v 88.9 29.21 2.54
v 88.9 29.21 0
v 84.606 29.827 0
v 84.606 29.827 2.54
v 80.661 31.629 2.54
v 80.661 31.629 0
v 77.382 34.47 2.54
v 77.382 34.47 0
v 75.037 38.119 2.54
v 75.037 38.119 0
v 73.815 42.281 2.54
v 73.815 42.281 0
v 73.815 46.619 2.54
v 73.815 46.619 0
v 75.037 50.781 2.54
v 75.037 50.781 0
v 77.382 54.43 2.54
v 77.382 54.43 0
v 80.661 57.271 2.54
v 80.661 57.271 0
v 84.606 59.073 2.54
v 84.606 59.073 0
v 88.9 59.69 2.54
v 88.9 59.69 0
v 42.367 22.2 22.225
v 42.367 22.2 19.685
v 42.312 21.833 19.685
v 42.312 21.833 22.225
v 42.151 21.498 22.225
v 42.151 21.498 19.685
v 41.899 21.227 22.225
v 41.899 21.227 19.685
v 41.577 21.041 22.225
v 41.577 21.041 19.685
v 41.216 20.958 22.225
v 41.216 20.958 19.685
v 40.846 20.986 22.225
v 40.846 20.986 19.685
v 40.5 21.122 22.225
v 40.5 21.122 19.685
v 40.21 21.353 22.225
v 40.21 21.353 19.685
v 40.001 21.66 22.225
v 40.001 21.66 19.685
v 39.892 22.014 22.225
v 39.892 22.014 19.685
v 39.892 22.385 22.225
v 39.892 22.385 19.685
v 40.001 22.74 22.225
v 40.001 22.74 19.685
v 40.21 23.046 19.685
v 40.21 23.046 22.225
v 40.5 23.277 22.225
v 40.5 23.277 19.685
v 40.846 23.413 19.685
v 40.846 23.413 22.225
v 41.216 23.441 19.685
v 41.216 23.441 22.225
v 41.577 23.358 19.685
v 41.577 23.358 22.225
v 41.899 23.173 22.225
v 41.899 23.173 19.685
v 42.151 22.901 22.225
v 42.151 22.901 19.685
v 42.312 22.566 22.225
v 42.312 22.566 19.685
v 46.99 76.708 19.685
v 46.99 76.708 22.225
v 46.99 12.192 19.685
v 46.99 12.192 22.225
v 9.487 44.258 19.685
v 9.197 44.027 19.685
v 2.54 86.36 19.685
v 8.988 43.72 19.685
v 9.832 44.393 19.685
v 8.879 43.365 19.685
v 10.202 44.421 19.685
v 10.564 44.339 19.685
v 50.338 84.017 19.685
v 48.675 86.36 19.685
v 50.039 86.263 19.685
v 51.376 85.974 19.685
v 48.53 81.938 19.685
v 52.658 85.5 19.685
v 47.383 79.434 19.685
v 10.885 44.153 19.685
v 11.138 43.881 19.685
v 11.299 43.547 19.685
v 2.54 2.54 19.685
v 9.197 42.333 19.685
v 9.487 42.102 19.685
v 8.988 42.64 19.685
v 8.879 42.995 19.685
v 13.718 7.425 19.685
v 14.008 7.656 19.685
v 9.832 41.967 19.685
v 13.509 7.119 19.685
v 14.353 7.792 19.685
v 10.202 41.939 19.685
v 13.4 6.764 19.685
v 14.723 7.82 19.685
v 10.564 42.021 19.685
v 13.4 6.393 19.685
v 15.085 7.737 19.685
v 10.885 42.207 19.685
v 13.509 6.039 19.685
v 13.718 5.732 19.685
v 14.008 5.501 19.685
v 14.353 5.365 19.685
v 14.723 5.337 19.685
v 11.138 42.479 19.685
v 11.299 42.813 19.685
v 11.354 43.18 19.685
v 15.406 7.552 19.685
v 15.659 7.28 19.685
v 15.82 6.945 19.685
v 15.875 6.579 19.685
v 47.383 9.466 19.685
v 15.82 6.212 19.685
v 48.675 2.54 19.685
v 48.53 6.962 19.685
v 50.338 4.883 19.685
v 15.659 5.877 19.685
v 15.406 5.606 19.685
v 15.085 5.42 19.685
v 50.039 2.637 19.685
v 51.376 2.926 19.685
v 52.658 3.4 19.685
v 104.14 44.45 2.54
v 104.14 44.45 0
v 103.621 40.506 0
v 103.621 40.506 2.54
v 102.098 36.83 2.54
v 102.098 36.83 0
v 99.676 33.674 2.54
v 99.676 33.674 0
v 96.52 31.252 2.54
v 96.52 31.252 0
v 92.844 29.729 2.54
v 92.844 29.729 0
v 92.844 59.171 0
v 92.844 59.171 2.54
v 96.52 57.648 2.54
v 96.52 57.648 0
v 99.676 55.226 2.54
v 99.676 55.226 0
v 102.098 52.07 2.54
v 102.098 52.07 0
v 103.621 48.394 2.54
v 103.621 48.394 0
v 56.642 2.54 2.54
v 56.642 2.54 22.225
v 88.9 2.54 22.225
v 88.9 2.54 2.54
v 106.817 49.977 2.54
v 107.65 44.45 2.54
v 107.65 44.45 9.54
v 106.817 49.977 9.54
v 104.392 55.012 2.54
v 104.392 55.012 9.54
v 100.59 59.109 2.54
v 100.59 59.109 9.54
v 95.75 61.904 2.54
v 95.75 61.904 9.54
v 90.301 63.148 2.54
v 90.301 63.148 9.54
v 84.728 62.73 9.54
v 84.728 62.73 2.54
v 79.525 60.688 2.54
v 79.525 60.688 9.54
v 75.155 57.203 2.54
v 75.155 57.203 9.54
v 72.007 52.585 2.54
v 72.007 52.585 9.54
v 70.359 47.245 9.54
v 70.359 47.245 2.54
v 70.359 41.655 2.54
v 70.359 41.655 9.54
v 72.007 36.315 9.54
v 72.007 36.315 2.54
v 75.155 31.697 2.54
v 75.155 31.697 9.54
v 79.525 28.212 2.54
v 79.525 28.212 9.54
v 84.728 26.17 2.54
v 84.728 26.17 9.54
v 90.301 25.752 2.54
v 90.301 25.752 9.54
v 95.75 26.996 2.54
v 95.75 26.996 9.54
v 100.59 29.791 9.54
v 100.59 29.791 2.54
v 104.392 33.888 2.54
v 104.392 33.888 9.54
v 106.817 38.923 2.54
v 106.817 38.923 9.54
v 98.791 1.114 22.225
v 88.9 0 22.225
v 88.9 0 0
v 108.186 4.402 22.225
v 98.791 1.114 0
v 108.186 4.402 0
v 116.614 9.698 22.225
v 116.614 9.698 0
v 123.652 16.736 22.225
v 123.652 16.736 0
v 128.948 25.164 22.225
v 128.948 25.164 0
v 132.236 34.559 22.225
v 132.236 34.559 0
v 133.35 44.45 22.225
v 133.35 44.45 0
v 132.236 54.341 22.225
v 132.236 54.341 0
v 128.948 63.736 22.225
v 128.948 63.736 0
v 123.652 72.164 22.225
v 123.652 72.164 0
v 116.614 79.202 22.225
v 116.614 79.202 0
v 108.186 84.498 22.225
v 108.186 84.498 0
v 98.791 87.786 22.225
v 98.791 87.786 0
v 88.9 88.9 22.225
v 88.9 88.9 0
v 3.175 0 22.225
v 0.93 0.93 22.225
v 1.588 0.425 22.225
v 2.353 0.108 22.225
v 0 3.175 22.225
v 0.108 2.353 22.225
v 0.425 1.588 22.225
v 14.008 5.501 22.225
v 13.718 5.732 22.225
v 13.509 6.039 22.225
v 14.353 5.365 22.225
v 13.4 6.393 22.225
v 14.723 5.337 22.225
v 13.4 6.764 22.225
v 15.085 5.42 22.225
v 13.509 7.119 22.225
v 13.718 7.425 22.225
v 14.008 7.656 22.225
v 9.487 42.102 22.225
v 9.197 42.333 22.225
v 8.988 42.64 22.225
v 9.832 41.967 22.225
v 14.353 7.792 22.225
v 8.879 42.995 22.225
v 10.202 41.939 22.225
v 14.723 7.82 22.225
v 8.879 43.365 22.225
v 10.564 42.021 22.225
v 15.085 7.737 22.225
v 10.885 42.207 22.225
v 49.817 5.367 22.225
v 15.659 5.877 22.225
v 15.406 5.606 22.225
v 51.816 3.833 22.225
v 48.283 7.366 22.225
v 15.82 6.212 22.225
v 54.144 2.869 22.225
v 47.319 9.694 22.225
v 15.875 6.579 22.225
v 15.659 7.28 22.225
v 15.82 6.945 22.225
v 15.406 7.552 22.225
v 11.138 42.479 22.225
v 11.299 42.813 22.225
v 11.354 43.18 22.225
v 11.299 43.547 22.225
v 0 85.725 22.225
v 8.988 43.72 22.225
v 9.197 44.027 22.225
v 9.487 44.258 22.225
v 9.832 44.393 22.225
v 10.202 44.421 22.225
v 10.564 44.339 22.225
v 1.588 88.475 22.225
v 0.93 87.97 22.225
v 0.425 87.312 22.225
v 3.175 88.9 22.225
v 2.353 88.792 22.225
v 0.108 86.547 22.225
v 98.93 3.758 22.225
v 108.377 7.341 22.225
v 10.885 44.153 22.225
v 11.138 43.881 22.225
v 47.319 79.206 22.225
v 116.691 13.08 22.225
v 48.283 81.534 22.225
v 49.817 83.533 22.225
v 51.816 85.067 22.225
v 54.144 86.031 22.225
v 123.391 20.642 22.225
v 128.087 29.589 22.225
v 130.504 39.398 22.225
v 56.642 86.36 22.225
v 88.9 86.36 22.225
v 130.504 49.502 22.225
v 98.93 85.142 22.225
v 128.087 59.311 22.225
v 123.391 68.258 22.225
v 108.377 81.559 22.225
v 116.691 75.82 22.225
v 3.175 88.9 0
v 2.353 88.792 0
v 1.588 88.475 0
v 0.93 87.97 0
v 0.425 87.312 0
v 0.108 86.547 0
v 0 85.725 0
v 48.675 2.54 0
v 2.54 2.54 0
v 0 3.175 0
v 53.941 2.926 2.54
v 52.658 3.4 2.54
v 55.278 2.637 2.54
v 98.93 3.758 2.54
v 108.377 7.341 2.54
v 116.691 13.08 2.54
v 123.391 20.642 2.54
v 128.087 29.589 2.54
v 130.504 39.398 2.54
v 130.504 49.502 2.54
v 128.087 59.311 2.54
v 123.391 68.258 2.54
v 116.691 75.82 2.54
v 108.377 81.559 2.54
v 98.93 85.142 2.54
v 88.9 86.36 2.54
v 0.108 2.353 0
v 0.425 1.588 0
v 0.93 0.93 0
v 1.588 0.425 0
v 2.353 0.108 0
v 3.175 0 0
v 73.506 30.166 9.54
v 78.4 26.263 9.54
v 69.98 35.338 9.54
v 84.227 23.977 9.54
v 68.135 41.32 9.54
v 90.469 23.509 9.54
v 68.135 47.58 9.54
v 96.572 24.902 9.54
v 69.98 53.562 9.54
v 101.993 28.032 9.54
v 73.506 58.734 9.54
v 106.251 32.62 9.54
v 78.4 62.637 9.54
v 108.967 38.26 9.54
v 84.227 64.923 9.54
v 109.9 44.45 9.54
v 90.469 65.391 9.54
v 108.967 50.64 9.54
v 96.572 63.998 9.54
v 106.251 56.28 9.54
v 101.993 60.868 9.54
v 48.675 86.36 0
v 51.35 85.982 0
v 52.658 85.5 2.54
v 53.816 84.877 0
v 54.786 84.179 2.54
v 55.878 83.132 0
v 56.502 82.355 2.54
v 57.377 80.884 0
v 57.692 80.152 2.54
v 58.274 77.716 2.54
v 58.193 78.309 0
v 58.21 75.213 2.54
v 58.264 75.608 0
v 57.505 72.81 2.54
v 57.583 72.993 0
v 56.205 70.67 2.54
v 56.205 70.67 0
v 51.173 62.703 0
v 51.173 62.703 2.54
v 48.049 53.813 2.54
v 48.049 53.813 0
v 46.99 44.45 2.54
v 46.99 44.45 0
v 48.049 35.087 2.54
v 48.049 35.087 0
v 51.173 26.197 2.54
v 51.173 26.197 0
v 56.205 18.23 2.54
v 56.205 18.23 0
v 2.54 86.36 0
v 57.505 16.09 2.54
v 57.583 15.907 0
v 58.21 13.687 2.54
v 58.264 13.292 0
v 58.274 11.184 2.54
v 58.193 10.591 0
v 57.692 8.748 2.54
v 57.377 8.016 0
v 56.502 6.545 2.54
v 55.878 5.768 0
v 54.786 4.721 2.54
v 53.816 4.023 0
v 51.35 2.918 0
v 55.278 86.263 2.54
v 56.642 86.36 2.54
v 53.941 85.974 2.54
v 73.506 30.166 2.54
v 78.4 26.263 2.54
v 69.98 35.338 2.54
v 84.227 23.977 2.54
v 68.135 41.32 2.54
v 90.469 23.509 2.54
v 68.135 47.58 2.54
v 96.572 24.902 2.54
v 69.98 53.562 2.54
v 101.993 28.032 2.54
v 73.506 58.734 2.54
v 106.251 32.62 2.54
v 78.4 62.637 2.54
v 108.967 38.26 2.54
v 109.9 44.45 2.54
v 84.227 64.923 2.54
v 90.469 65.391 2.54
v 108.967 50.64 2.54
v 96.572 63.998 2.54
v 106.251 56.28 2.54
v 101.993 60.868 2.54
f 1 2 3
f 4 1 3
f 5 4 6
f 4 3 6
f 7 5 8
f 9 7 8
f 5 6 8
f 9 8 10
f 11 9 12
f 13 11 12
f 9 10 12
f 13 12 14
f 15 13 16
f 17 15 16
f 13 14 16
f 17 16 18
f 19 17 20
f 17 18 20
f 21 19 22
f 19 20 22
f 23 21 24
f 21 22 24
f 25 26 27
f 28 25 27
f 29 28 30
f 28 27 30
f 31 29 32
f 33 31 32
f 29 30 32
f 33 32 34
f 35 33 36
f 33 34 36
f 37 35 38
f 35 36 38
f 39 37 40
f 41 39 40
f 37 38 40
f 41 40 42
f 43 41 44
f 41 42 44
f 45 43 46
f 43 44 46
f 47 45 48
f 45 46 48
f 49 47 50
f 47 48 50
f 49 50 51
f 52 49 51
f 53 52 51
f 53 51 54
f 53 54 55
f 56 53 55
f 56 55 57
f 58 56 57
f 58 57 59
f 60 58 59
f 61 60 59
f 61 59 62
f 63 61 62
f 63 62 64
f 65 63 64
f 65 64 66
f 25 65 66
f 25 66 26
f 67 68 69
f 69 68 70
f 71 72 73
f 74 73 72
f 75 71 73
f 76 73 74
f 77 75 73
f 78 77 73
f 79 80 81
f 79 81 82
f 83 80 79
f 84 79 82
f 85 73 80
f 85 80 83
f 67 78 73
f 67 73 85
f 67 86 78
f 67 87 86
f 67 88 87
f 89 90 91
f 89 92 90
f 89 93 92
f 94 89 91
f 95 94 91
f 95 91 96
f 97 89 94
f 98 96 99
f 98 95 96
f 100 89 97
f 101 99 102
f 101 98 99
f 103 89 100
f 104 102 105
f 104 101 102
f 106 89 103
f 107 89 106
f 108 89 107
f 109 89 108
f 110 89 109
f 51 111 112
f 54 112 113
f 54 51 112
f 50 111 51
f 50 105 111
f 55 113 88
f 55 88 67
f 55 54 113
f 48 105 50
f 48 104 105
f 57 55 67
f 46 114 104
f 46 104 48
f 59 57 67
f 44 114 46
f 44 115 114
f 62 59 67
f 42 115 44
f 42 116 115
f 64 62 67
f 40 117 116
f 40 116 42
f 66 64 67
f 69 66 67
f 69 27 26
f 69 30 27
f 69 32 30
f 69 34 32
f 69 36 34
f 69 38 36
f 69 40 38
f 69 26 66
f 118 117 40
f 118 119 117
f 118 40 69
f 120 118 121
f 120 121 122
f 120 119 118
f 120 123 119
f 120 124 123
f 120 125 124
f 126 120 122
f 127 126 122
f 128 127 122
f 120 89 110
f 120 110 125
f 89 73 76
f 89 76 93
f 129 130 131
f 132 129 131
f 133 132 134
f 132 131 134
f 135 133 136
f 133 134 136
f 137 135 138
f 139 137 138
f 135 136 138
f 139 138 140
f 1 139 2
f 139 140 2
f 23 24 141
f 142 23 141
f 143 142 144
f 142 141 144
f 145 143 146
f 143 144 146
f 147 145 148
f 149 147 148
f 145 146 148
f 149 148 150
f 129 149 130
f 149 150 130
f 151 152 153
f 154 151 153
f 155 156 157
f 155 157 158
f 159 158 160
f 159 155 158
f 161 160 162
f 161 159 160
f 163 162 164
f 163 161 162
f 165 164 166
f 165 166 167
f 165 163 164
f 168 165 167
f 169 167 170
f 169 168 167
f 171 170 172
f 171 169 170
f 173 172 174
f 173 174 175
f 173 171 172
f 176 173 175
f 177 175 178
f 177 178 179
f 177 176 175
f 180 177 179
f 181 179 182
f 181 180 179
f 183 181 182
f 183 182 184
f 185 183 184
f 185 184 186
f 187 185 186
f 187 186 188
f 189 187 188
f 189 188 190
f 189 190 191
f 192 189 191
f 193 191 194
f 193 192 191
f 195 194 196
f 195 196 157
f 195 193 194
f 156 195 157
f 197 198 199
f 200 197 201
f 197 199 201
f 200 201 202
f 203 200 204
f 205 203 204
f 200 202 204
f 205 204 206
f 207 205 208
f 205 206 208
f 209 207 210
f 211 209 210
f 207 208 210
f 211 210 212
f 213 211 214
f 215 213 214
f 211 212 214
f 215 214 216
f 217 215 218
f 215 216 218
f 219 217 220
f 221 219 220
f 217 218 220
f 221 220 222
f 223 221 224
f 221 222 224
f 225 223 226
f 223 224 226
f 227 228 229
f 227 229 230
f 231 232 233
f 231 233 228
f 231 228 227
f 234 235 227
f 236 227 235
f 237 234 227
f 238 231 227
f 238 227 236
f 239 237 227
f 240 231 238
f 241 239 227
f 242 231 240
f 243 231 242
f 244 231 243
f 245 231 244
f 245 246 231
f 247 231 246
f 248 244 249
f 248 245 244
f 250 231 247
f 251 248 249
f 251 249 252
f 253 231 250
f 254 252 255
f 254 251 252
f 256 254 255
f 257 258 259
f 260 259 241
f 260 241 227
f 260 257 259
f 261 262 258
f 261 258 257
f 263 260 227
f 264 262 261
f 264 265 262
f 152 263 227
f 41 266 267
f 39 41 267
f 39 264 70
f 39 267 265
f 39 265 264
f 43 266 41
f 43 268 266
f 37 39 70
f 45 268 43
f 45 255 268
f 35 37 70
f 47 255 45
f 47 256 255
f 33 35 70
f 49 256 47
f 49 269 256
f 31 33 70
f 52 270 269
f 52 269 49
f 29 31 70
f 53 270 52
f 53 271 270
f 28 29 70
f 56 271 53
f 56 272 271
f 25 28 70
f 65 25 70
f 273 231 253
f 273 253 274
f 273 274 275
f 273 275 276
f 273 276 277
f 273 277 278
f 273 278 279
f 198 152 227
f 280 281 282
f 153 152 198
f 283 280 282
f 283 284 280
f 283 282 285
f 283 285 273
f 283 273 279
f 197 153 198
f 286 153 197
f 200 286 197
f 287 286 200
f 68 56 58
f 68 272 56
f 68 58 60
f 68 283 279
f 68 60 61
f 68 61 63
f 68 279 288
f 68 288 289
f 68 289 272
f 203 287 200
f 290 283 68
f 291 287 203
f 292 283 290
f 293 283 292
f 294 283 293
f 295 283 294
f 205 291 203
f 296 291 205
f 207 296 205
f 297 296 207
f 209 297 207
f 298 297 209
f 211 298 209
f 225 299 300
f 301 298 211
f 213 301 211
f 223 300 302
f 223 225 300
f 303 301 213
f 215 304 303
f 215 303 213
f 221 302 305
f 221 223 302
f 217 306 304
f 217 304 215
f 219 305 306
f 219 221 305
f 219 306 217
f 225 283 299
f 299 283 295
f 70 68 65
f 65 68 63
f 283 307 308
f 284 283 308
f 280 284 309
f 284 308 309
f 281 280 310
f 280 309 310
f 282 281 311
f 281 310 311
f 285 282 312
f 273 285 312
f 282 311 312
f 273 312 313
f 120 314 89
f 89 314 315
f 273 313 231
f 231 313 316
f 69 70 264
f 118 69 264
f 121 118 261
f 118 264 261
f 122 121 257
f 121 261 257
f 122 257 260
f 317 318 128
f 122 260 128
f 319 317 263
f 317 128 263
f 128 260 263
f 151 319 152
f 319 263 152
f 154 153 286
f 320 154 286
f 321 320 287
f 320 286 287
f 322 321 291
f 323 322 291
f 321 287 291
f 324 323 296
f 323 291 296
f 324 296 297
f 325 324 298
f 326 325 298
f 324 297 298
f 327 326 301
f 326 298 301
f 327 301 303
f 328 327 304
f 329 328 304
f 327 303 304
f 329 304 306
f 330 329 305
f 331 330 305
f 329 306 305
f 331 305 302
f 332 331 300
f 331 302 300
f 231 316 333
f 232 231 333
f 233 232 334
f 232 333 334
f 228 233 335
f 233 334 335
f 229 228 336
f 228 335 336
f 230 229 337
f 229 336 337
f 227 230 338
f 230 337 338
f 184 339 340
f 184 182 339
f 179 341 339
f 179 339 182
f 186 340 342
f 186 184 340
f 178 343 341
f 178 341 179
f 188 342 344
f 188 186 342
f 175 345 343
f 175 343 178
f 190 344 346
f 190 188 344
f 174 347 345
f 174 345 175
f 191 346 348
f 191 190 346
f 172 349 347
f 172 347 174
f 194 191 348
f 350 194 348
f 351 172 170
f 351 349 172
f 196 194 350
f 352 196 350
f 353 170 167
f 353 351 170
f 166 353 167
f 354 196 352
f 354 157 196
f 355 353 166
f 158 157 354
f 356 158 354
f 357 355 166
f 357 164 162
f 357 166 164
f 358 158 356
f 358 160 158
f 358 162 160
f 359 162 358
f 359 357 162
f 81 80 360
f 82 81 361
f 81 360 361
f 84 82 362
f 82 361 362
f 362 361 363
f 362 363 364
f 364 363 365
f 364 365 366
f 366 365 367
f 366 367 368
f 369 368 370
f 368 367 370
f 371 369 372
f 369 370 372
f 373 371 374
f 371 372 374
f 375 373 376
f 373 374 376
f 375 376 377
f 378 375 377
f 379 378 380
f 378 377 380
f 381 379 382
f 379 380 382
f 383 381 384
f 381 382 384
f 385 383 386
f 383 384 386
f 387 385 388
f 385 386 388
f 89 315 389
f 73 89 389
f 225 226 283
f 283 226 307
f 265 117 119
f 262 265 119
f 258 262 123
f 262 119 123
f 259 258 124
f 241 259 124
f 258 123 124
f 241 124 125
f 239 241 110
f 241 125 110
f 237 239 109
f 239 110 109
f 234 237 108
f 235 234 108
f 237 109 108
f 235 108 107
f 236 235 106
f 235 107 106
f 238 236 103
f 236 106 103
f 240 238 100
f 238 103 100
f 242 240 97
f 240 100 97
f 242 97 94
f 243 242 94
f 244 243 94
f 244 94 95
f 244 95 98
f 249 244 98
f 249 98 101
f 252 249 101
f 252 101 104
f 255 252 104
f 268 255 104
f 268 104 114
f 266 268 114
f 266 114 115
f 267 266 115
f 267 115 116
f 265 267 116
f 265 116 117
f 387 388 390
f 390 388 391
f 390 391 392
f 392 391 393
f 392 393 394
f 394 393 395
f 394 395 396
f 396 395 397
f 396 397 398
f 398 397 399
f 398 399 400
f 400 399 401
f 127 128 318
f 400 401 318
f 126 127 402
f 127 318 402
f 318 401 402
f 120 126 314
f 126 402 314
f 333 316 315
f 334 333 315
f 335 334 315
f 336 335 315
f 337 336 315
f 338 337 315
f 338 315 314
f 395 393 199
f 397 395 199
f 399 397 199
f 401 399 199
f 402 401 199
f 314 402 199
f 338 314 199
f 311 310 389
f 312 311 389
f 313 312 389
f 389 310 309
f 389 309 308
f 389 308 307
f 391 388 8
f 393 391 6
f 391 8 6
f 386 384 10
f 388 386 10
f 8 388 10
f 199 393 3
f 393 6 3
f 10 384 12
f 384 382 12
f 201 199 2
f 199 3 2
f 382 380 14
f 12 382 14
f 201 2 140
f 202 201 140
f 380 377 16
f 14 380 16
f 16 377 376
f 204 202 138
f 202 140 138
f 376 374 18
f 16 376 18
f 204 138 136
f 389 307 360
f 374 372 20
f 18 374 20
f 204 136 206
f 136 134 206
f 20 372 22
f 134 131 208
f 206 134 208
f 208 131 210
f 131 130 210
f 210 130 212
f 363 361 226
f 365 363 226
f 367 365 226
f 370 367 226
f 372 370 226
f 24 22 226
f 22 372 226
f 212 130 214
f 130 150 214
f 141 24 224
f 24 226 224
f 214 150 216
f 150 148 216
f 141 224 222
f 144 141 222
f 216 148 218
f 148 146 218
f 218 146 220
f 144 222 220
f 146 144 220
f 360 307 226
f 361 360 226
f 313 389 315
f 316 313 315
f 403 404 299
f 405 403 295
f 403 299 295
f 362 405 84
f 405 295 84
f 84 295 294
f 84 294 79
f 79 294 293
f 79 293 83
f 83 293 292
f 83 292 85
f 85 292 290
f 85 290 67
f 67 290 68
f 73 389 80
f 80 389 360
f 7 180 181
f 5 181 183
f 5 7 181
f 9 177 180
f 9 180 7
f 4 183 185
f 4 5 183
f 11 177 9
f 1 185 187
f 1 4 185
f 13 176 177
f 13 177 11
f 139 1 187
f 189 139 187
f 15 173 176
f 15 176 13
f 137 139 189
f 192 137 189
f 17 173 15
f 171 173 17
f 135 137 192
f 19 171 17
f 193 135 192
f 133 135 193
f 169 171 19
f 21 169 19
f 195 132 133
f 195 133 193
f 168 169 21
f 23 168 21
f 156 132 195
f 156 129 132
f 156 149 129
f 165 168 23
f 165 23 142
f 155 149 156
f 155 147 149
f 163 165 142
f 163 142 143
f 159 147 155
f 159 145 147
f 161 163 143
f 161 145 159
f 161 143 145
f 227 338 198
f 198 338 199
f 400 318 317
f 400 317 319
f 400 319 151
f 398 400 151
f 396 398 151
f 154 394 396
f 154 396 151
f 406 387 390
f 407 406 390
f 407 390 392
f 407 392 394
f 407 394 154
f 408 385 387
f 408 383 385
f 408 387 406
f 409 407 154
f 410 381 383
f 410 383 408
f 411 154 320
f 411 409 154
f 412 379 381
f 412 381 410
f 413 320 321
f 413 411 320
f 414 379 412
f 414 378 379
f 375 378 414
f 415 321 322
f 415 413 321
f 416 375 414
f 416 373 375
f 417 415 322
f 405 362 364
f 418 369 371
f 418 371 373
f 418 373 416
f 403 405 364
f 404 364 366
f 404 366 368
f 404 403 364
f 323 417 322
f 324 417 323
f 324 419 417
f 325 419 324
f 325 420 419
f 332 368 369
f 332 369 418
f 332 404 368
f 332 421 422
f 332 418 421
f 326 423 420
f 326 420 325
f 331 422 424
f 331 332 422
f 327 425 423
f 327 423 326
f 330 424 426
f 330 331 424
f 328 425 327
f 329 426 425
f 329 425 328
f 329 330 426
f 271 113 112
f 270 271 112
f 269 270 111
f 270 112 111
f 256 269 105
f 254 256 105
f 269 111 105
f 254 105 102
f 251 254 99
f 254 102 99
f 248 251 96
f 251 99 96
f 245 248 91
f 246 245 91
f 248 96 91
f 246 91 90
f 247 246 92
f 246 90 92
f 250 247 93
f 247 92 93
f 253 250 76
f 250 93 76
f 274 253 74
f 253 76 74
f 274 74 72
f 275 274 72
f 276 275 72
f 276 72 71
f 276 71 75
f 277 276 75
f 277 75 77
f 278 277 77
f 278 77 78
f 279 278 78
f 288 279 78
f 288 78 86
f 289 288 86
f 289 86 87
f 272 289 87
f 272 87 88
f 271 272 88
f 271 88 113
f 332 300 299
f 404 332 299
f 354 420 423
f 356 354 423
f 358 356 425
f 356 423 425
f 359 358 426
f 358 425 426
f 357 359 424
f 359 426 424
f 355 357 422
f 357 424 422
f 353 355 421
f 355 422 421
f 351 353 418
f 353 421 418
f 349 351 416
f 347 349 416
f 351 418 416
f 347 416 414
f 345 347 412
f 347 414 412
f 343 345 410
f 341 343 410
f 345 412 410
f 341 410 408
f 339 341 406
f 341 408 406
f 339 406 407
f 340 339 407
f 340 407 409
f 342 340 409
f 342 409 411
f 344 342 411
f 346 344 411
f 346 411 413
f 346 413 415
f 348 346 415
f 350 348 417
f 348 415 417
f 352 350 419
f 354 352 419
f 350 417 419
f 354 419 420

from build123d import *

# Parameters (mm, degrees)
F1_DEPTH = 22.225
F3_DEPTH = 19.685
F5_DEPTH = 19.685
F6_R     = 21
F6_R_2   = 18.75
F7_DEPTH = 7
F8_R     = 1.2446
F9_DEPTH = 2.541


with BuildPart() as f1:
    # F0 (on Top) → F1 (new body)
    with BuildSketch(Plane.XY):
        with BuildLine():
            ThreePointArc((0, 3.175), (0.929936, 0.929936), (3.175, 0))
            Line((3.175, 0), (88.9, 0))
            Line((88.9, 0), (88.9, 29.21))
            ThreePointArc((88.9, 29.21), (73.66, 44.45), (88.9, 59.69))
            Line((88.9, 59.69), (88.9, 88.9))
            Line((88.9, 88.9), (3.175, 88.9))
            ThreePointArc((3.175, 88.9), (0.929936, 87.970064), (0, 85.725))
            Line((0, 85.725), (0, 3.175))
        make_face()
        with BuildLine():
            Line((88.9, 29.21), (88.9, 0))
            ThreePointArc((88.9, 0), (133.35, 44.45), (88.9, 88.9))
            Line((88.9, 88.9), (88.9, 59.69))
            ThreePointArc((88.9, 59.69), (99.676307, 55.226307), (104.14, 44.45))
            ThreePointArc((104.14, 44.45), (99.676307, 33.673693), (88.9, 29.21))
        make_face()
    extrude(amount=F1_DEPTH)

    # F2 (on face) → F3 (cut)
    with BuildSketch(Plane.XY.offset(22.225)):
        with BuildLine():
            Line((88.9, 86.36), (88.9, 2.54))
            ThreePointArc((88.9, 2.54), (130.81, 44.45), (88.9, 86.36))
        make_face()
        with BuildLine():
            Line((56.642, 2.54), (88.9, 2.54))
            Line((88.9, 2.54), (88.9, 86.36))
            Line((88.9, 86.36), (56.642, 86.36))
            ThreePointArc((56.642, 86.36), (49.817005, 83.532995), (46.99, 76.708))
            Line((46.99, 76.708), (46.99, 12.192))
            ThreePointArc((46.99, 12.192), (49.817005, 5.367005), (56.642, 2.54))
        make_face()
    extrude(amount=-F3_DEPTH, mode=Mode.SUBTRACT)

    # F4 (on face) → F5 (cut)
    with BuildSketch(Plane(origin=(0, 0, 0), x_dir=(1, 0, 0), z_dir=(0, 0, -1))):
        with BuildLine():
            ThreePointArc((56.204695, -70.669557), (46.99, -44.45), (56.204695, -18.230443))
            ThreePointArc((56.204695, -18.230443), (57.376711, -8.015994), (48.674868, -2.54))
            Line((48.674868, -2.54), (2.54, -2.54))
            Line((2.54, -2.54), (2.54, -86.36))
            Line((2.54, -86.36), (48.674868, -86.36))
            ThreePointArc((48.674868, -86.36), (57.376711, -80.884006), (56.204695, -70.669557))
        make_face()
    extrude(amount=-F5_DEPTH, mode=Mode.SUBTRACT)

    # F6 (on face) → F7 (join)
    with BuildSketch(Plane.XY.offset(2.54)):
        with Locations((88.9, 44.45)):
            Circle(F6_R)
        with Locations((88.9, 44.45)):
            Circle(F6_R_2, mode=Mode.SUBTRACT)
    extrude(amount=F7_DEPTH)

    # F8 (on face) → F9 (cut, through all)
    with BuildSketch(Plane(origin=(0, 0, 19.685), x_dir=(1, 0, 0), z_dir=(0, 0, -1))):
        with Locations((10.1092, -43.18)):
            Circle(F8_R)
        with Locations((14.6304, -6.5786)):
            Circle(F8_R)
        with Locations((41.1226, -22.1996)):
            Circle(F8_R)
    extrude(amount=-F9_DEPTH, mode=Mode.SUBTRACT)


solid = f1.part
